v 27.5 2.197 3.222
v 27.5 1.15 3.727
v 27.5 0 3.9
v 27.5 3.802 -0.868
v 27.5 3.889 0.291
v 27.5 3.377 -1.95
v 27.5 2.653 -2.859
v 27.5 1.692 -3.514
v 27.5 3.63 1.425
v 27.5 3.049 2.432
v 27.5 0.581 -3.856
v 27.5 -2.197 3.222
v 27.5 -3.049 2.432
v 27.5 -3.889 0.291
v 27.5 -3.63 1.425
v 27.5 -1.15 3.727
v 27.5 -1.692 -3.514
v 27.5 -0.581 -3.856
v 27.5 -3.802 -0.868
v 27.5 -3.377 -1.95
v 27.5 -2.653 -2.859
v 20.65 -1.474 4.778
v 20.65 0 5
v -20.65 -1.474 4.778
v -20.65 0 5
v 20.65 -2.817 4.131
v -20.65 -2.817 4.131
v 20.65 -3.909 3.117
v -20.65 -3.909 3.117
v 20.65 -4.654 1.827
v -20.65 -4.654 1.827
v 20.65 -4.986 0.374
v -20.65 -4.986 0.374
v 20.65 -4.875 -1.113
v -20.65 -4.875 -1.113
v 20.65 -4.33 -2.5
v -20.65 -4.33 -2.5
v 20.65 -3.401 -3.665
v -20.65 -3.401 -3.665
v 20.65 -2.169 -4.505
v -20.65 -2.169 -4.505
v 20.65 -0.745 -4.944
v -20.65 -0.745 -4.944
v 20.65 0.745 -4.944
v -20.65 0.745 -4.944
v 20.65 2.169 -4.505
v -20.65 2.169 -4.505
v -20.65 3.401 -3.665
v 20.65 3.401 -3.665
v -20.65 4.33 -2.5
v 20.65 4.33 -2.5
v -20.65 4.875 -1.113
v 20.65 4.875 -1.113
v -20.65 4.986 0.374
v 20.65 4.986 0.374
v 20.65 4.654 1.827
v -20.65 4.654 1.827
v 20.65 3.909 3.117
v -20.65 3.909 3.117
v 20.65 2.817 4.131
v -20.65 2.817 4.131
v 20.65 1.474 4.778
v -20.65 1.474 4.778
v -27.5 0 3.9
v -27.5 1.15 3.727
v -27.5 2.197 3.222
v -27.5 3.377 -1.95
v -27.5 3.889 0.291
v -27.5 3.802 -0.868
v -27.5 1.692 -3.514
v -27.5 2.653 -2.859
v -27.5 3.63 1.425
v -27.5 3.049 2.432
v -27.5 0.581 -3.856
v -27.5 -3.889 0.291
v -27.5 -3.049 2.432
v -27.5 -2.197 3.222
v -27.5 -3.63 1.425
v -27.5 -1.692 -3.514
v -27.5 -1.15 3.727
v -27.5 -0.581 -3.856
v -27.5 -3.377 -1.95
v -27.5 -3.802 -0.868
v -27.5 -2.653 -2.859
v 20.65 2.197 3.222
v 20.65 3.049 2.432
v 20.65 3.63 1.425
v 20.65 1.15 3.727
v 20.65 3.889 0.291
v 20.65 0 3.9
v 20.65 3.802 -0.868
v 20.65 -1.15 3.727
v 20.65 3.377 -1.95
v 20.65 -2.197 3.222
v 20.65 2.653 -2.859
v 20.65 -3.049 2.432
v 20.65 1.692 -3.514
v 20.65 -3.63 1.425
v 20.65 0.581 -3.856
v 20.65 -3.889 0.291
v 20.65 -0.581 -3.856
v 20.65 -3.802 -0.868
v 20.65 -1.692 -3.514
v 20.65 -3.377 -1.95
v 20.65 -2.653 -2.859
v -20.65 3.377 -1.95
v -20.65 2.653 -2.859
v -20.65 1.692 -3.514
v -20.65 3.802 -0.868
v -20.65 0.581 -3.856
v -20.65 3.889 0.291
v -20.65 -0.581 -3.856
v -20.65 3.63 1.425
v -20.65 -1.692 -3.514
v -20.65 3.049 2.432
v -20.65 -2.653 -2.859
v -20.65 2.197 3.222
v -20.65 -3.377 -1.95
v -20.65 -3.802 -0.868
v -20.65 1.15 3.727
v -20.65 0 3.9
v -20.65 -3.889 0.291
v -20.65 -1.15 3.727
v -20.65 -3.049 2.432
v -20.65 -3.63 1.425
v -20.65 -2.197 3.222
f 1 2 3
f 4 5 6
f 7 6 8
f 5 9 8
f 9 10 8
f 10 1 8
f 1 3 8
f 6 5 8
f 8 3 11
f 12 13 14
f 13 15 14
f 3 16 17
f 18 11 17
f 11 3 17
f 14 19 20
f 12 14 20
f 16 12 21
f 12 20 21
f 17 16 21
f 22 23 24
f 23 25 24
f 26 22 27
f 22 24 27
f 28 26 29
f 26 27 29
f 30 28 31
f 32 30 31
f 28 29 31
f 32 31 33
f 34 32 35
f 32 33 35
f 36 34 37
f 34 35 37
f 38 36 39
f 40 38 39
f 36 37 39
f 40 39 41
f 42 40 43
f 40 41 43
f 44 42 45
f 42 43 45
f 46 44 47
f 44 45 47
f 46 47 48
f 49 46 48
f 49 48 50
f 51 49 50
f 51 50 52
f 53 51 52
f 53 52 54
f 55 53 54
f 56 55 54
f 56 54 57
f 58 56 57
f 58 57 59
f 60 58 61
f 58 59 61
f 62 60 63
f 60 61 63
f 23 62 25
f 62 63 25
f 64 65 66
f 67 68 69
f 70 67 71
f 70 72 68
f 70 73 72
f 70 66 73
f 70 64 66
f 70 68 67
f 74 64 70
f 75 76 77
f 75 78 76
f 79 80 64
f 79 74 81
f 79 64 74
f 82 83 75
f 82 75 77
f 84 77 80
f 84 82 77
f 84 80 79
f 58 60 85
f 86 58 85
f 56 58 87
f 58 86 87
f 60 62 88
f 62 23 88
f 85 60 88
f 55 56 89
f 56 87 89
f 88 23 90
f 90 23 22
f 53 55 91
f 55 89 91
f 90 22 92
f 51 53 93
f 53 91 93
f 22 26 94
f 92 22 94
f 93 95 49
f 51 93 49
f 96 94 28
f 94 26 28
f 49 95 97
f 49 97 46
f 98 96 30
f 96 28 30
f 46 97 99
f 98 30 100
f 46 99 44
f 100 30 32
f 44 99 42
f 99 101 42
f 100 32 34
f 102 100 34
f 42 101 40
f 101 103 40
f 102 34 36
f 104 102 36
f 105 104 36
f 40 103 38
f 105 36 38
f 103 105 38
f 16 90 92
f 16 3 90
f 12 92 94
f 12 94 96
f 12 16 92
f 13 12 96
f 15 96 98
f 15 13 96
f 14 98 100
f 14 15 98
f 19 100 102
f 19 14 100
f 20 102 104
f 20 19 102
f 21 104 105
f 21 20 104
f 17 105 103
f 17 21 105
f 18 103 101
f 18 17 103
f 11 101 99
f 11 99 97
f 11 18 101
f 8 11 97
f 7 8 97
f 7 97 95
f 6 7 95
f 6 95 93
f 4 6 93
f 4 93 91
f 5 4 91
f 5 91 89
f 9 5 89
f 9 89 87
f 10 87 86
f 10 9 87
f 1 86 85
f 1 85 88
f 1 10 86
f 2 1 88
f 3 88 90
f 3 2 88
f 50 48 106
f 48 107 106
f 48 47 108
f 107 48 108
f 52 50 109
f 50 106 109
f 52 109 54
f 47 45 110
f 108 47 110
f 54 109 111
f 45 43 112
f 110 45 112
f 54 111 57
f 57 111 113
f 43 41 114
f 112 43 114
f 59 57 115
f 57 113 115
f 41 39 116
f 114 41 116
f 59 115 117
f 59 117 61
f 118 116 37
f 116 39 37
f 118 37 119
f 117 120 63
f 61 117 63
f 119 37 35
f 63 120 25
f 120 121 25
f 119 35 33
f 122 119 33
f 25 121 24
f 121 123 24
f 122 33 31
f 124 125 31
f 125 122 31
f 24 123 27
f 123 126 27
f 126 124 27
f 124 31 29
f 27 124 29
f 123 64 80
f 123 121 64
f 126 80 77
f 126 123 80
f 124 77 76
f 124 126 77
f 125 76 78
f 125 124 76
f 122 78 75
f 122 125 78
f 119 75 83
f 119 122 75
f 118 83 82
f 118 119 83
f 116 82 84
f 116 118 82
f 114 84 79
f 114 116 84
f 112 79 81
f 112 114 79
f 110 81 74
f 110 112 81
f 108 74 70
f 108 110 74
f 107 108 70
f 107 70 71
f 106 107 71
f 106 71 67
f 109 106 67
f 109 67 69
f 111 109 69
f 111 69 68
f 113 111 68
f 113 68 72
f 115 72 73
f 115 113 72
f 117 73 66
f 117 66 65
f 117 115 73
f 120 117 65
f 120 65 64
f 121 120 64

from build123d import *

# Parameters (mm, degrees)
SKETCH1_W = 6.85
SKETCH1_H = 3.9


with BuildPart() as part:
    # Sketch1 → Revolve1 (revolve)
    with BuildSketch(Plane.XY, mode=Mode.PRIVATE) as revolve1_sk:
        Polygon((20.65, 5), (-20.65, 5), (-20.65, 3.9), (-20.65, 0), (20.65, 0), (20.65, 3.9), align=None)
        with Locations((-24.075, 1.95)):
            Rectangle(SKETCH1_W, SKETCH1_H)
        with Locations((24.075, 1.95)):
            Rectangle(SKETCH1_W, SKETCH1_H)
    revolve(revolve1_sk.sketch.rotate(Axis((-27.5, 0, 0), (1, 0, 0)), 90), axis=Axis((-27.5, 0, 0), (1, 0, 0)))


solid = part.part
